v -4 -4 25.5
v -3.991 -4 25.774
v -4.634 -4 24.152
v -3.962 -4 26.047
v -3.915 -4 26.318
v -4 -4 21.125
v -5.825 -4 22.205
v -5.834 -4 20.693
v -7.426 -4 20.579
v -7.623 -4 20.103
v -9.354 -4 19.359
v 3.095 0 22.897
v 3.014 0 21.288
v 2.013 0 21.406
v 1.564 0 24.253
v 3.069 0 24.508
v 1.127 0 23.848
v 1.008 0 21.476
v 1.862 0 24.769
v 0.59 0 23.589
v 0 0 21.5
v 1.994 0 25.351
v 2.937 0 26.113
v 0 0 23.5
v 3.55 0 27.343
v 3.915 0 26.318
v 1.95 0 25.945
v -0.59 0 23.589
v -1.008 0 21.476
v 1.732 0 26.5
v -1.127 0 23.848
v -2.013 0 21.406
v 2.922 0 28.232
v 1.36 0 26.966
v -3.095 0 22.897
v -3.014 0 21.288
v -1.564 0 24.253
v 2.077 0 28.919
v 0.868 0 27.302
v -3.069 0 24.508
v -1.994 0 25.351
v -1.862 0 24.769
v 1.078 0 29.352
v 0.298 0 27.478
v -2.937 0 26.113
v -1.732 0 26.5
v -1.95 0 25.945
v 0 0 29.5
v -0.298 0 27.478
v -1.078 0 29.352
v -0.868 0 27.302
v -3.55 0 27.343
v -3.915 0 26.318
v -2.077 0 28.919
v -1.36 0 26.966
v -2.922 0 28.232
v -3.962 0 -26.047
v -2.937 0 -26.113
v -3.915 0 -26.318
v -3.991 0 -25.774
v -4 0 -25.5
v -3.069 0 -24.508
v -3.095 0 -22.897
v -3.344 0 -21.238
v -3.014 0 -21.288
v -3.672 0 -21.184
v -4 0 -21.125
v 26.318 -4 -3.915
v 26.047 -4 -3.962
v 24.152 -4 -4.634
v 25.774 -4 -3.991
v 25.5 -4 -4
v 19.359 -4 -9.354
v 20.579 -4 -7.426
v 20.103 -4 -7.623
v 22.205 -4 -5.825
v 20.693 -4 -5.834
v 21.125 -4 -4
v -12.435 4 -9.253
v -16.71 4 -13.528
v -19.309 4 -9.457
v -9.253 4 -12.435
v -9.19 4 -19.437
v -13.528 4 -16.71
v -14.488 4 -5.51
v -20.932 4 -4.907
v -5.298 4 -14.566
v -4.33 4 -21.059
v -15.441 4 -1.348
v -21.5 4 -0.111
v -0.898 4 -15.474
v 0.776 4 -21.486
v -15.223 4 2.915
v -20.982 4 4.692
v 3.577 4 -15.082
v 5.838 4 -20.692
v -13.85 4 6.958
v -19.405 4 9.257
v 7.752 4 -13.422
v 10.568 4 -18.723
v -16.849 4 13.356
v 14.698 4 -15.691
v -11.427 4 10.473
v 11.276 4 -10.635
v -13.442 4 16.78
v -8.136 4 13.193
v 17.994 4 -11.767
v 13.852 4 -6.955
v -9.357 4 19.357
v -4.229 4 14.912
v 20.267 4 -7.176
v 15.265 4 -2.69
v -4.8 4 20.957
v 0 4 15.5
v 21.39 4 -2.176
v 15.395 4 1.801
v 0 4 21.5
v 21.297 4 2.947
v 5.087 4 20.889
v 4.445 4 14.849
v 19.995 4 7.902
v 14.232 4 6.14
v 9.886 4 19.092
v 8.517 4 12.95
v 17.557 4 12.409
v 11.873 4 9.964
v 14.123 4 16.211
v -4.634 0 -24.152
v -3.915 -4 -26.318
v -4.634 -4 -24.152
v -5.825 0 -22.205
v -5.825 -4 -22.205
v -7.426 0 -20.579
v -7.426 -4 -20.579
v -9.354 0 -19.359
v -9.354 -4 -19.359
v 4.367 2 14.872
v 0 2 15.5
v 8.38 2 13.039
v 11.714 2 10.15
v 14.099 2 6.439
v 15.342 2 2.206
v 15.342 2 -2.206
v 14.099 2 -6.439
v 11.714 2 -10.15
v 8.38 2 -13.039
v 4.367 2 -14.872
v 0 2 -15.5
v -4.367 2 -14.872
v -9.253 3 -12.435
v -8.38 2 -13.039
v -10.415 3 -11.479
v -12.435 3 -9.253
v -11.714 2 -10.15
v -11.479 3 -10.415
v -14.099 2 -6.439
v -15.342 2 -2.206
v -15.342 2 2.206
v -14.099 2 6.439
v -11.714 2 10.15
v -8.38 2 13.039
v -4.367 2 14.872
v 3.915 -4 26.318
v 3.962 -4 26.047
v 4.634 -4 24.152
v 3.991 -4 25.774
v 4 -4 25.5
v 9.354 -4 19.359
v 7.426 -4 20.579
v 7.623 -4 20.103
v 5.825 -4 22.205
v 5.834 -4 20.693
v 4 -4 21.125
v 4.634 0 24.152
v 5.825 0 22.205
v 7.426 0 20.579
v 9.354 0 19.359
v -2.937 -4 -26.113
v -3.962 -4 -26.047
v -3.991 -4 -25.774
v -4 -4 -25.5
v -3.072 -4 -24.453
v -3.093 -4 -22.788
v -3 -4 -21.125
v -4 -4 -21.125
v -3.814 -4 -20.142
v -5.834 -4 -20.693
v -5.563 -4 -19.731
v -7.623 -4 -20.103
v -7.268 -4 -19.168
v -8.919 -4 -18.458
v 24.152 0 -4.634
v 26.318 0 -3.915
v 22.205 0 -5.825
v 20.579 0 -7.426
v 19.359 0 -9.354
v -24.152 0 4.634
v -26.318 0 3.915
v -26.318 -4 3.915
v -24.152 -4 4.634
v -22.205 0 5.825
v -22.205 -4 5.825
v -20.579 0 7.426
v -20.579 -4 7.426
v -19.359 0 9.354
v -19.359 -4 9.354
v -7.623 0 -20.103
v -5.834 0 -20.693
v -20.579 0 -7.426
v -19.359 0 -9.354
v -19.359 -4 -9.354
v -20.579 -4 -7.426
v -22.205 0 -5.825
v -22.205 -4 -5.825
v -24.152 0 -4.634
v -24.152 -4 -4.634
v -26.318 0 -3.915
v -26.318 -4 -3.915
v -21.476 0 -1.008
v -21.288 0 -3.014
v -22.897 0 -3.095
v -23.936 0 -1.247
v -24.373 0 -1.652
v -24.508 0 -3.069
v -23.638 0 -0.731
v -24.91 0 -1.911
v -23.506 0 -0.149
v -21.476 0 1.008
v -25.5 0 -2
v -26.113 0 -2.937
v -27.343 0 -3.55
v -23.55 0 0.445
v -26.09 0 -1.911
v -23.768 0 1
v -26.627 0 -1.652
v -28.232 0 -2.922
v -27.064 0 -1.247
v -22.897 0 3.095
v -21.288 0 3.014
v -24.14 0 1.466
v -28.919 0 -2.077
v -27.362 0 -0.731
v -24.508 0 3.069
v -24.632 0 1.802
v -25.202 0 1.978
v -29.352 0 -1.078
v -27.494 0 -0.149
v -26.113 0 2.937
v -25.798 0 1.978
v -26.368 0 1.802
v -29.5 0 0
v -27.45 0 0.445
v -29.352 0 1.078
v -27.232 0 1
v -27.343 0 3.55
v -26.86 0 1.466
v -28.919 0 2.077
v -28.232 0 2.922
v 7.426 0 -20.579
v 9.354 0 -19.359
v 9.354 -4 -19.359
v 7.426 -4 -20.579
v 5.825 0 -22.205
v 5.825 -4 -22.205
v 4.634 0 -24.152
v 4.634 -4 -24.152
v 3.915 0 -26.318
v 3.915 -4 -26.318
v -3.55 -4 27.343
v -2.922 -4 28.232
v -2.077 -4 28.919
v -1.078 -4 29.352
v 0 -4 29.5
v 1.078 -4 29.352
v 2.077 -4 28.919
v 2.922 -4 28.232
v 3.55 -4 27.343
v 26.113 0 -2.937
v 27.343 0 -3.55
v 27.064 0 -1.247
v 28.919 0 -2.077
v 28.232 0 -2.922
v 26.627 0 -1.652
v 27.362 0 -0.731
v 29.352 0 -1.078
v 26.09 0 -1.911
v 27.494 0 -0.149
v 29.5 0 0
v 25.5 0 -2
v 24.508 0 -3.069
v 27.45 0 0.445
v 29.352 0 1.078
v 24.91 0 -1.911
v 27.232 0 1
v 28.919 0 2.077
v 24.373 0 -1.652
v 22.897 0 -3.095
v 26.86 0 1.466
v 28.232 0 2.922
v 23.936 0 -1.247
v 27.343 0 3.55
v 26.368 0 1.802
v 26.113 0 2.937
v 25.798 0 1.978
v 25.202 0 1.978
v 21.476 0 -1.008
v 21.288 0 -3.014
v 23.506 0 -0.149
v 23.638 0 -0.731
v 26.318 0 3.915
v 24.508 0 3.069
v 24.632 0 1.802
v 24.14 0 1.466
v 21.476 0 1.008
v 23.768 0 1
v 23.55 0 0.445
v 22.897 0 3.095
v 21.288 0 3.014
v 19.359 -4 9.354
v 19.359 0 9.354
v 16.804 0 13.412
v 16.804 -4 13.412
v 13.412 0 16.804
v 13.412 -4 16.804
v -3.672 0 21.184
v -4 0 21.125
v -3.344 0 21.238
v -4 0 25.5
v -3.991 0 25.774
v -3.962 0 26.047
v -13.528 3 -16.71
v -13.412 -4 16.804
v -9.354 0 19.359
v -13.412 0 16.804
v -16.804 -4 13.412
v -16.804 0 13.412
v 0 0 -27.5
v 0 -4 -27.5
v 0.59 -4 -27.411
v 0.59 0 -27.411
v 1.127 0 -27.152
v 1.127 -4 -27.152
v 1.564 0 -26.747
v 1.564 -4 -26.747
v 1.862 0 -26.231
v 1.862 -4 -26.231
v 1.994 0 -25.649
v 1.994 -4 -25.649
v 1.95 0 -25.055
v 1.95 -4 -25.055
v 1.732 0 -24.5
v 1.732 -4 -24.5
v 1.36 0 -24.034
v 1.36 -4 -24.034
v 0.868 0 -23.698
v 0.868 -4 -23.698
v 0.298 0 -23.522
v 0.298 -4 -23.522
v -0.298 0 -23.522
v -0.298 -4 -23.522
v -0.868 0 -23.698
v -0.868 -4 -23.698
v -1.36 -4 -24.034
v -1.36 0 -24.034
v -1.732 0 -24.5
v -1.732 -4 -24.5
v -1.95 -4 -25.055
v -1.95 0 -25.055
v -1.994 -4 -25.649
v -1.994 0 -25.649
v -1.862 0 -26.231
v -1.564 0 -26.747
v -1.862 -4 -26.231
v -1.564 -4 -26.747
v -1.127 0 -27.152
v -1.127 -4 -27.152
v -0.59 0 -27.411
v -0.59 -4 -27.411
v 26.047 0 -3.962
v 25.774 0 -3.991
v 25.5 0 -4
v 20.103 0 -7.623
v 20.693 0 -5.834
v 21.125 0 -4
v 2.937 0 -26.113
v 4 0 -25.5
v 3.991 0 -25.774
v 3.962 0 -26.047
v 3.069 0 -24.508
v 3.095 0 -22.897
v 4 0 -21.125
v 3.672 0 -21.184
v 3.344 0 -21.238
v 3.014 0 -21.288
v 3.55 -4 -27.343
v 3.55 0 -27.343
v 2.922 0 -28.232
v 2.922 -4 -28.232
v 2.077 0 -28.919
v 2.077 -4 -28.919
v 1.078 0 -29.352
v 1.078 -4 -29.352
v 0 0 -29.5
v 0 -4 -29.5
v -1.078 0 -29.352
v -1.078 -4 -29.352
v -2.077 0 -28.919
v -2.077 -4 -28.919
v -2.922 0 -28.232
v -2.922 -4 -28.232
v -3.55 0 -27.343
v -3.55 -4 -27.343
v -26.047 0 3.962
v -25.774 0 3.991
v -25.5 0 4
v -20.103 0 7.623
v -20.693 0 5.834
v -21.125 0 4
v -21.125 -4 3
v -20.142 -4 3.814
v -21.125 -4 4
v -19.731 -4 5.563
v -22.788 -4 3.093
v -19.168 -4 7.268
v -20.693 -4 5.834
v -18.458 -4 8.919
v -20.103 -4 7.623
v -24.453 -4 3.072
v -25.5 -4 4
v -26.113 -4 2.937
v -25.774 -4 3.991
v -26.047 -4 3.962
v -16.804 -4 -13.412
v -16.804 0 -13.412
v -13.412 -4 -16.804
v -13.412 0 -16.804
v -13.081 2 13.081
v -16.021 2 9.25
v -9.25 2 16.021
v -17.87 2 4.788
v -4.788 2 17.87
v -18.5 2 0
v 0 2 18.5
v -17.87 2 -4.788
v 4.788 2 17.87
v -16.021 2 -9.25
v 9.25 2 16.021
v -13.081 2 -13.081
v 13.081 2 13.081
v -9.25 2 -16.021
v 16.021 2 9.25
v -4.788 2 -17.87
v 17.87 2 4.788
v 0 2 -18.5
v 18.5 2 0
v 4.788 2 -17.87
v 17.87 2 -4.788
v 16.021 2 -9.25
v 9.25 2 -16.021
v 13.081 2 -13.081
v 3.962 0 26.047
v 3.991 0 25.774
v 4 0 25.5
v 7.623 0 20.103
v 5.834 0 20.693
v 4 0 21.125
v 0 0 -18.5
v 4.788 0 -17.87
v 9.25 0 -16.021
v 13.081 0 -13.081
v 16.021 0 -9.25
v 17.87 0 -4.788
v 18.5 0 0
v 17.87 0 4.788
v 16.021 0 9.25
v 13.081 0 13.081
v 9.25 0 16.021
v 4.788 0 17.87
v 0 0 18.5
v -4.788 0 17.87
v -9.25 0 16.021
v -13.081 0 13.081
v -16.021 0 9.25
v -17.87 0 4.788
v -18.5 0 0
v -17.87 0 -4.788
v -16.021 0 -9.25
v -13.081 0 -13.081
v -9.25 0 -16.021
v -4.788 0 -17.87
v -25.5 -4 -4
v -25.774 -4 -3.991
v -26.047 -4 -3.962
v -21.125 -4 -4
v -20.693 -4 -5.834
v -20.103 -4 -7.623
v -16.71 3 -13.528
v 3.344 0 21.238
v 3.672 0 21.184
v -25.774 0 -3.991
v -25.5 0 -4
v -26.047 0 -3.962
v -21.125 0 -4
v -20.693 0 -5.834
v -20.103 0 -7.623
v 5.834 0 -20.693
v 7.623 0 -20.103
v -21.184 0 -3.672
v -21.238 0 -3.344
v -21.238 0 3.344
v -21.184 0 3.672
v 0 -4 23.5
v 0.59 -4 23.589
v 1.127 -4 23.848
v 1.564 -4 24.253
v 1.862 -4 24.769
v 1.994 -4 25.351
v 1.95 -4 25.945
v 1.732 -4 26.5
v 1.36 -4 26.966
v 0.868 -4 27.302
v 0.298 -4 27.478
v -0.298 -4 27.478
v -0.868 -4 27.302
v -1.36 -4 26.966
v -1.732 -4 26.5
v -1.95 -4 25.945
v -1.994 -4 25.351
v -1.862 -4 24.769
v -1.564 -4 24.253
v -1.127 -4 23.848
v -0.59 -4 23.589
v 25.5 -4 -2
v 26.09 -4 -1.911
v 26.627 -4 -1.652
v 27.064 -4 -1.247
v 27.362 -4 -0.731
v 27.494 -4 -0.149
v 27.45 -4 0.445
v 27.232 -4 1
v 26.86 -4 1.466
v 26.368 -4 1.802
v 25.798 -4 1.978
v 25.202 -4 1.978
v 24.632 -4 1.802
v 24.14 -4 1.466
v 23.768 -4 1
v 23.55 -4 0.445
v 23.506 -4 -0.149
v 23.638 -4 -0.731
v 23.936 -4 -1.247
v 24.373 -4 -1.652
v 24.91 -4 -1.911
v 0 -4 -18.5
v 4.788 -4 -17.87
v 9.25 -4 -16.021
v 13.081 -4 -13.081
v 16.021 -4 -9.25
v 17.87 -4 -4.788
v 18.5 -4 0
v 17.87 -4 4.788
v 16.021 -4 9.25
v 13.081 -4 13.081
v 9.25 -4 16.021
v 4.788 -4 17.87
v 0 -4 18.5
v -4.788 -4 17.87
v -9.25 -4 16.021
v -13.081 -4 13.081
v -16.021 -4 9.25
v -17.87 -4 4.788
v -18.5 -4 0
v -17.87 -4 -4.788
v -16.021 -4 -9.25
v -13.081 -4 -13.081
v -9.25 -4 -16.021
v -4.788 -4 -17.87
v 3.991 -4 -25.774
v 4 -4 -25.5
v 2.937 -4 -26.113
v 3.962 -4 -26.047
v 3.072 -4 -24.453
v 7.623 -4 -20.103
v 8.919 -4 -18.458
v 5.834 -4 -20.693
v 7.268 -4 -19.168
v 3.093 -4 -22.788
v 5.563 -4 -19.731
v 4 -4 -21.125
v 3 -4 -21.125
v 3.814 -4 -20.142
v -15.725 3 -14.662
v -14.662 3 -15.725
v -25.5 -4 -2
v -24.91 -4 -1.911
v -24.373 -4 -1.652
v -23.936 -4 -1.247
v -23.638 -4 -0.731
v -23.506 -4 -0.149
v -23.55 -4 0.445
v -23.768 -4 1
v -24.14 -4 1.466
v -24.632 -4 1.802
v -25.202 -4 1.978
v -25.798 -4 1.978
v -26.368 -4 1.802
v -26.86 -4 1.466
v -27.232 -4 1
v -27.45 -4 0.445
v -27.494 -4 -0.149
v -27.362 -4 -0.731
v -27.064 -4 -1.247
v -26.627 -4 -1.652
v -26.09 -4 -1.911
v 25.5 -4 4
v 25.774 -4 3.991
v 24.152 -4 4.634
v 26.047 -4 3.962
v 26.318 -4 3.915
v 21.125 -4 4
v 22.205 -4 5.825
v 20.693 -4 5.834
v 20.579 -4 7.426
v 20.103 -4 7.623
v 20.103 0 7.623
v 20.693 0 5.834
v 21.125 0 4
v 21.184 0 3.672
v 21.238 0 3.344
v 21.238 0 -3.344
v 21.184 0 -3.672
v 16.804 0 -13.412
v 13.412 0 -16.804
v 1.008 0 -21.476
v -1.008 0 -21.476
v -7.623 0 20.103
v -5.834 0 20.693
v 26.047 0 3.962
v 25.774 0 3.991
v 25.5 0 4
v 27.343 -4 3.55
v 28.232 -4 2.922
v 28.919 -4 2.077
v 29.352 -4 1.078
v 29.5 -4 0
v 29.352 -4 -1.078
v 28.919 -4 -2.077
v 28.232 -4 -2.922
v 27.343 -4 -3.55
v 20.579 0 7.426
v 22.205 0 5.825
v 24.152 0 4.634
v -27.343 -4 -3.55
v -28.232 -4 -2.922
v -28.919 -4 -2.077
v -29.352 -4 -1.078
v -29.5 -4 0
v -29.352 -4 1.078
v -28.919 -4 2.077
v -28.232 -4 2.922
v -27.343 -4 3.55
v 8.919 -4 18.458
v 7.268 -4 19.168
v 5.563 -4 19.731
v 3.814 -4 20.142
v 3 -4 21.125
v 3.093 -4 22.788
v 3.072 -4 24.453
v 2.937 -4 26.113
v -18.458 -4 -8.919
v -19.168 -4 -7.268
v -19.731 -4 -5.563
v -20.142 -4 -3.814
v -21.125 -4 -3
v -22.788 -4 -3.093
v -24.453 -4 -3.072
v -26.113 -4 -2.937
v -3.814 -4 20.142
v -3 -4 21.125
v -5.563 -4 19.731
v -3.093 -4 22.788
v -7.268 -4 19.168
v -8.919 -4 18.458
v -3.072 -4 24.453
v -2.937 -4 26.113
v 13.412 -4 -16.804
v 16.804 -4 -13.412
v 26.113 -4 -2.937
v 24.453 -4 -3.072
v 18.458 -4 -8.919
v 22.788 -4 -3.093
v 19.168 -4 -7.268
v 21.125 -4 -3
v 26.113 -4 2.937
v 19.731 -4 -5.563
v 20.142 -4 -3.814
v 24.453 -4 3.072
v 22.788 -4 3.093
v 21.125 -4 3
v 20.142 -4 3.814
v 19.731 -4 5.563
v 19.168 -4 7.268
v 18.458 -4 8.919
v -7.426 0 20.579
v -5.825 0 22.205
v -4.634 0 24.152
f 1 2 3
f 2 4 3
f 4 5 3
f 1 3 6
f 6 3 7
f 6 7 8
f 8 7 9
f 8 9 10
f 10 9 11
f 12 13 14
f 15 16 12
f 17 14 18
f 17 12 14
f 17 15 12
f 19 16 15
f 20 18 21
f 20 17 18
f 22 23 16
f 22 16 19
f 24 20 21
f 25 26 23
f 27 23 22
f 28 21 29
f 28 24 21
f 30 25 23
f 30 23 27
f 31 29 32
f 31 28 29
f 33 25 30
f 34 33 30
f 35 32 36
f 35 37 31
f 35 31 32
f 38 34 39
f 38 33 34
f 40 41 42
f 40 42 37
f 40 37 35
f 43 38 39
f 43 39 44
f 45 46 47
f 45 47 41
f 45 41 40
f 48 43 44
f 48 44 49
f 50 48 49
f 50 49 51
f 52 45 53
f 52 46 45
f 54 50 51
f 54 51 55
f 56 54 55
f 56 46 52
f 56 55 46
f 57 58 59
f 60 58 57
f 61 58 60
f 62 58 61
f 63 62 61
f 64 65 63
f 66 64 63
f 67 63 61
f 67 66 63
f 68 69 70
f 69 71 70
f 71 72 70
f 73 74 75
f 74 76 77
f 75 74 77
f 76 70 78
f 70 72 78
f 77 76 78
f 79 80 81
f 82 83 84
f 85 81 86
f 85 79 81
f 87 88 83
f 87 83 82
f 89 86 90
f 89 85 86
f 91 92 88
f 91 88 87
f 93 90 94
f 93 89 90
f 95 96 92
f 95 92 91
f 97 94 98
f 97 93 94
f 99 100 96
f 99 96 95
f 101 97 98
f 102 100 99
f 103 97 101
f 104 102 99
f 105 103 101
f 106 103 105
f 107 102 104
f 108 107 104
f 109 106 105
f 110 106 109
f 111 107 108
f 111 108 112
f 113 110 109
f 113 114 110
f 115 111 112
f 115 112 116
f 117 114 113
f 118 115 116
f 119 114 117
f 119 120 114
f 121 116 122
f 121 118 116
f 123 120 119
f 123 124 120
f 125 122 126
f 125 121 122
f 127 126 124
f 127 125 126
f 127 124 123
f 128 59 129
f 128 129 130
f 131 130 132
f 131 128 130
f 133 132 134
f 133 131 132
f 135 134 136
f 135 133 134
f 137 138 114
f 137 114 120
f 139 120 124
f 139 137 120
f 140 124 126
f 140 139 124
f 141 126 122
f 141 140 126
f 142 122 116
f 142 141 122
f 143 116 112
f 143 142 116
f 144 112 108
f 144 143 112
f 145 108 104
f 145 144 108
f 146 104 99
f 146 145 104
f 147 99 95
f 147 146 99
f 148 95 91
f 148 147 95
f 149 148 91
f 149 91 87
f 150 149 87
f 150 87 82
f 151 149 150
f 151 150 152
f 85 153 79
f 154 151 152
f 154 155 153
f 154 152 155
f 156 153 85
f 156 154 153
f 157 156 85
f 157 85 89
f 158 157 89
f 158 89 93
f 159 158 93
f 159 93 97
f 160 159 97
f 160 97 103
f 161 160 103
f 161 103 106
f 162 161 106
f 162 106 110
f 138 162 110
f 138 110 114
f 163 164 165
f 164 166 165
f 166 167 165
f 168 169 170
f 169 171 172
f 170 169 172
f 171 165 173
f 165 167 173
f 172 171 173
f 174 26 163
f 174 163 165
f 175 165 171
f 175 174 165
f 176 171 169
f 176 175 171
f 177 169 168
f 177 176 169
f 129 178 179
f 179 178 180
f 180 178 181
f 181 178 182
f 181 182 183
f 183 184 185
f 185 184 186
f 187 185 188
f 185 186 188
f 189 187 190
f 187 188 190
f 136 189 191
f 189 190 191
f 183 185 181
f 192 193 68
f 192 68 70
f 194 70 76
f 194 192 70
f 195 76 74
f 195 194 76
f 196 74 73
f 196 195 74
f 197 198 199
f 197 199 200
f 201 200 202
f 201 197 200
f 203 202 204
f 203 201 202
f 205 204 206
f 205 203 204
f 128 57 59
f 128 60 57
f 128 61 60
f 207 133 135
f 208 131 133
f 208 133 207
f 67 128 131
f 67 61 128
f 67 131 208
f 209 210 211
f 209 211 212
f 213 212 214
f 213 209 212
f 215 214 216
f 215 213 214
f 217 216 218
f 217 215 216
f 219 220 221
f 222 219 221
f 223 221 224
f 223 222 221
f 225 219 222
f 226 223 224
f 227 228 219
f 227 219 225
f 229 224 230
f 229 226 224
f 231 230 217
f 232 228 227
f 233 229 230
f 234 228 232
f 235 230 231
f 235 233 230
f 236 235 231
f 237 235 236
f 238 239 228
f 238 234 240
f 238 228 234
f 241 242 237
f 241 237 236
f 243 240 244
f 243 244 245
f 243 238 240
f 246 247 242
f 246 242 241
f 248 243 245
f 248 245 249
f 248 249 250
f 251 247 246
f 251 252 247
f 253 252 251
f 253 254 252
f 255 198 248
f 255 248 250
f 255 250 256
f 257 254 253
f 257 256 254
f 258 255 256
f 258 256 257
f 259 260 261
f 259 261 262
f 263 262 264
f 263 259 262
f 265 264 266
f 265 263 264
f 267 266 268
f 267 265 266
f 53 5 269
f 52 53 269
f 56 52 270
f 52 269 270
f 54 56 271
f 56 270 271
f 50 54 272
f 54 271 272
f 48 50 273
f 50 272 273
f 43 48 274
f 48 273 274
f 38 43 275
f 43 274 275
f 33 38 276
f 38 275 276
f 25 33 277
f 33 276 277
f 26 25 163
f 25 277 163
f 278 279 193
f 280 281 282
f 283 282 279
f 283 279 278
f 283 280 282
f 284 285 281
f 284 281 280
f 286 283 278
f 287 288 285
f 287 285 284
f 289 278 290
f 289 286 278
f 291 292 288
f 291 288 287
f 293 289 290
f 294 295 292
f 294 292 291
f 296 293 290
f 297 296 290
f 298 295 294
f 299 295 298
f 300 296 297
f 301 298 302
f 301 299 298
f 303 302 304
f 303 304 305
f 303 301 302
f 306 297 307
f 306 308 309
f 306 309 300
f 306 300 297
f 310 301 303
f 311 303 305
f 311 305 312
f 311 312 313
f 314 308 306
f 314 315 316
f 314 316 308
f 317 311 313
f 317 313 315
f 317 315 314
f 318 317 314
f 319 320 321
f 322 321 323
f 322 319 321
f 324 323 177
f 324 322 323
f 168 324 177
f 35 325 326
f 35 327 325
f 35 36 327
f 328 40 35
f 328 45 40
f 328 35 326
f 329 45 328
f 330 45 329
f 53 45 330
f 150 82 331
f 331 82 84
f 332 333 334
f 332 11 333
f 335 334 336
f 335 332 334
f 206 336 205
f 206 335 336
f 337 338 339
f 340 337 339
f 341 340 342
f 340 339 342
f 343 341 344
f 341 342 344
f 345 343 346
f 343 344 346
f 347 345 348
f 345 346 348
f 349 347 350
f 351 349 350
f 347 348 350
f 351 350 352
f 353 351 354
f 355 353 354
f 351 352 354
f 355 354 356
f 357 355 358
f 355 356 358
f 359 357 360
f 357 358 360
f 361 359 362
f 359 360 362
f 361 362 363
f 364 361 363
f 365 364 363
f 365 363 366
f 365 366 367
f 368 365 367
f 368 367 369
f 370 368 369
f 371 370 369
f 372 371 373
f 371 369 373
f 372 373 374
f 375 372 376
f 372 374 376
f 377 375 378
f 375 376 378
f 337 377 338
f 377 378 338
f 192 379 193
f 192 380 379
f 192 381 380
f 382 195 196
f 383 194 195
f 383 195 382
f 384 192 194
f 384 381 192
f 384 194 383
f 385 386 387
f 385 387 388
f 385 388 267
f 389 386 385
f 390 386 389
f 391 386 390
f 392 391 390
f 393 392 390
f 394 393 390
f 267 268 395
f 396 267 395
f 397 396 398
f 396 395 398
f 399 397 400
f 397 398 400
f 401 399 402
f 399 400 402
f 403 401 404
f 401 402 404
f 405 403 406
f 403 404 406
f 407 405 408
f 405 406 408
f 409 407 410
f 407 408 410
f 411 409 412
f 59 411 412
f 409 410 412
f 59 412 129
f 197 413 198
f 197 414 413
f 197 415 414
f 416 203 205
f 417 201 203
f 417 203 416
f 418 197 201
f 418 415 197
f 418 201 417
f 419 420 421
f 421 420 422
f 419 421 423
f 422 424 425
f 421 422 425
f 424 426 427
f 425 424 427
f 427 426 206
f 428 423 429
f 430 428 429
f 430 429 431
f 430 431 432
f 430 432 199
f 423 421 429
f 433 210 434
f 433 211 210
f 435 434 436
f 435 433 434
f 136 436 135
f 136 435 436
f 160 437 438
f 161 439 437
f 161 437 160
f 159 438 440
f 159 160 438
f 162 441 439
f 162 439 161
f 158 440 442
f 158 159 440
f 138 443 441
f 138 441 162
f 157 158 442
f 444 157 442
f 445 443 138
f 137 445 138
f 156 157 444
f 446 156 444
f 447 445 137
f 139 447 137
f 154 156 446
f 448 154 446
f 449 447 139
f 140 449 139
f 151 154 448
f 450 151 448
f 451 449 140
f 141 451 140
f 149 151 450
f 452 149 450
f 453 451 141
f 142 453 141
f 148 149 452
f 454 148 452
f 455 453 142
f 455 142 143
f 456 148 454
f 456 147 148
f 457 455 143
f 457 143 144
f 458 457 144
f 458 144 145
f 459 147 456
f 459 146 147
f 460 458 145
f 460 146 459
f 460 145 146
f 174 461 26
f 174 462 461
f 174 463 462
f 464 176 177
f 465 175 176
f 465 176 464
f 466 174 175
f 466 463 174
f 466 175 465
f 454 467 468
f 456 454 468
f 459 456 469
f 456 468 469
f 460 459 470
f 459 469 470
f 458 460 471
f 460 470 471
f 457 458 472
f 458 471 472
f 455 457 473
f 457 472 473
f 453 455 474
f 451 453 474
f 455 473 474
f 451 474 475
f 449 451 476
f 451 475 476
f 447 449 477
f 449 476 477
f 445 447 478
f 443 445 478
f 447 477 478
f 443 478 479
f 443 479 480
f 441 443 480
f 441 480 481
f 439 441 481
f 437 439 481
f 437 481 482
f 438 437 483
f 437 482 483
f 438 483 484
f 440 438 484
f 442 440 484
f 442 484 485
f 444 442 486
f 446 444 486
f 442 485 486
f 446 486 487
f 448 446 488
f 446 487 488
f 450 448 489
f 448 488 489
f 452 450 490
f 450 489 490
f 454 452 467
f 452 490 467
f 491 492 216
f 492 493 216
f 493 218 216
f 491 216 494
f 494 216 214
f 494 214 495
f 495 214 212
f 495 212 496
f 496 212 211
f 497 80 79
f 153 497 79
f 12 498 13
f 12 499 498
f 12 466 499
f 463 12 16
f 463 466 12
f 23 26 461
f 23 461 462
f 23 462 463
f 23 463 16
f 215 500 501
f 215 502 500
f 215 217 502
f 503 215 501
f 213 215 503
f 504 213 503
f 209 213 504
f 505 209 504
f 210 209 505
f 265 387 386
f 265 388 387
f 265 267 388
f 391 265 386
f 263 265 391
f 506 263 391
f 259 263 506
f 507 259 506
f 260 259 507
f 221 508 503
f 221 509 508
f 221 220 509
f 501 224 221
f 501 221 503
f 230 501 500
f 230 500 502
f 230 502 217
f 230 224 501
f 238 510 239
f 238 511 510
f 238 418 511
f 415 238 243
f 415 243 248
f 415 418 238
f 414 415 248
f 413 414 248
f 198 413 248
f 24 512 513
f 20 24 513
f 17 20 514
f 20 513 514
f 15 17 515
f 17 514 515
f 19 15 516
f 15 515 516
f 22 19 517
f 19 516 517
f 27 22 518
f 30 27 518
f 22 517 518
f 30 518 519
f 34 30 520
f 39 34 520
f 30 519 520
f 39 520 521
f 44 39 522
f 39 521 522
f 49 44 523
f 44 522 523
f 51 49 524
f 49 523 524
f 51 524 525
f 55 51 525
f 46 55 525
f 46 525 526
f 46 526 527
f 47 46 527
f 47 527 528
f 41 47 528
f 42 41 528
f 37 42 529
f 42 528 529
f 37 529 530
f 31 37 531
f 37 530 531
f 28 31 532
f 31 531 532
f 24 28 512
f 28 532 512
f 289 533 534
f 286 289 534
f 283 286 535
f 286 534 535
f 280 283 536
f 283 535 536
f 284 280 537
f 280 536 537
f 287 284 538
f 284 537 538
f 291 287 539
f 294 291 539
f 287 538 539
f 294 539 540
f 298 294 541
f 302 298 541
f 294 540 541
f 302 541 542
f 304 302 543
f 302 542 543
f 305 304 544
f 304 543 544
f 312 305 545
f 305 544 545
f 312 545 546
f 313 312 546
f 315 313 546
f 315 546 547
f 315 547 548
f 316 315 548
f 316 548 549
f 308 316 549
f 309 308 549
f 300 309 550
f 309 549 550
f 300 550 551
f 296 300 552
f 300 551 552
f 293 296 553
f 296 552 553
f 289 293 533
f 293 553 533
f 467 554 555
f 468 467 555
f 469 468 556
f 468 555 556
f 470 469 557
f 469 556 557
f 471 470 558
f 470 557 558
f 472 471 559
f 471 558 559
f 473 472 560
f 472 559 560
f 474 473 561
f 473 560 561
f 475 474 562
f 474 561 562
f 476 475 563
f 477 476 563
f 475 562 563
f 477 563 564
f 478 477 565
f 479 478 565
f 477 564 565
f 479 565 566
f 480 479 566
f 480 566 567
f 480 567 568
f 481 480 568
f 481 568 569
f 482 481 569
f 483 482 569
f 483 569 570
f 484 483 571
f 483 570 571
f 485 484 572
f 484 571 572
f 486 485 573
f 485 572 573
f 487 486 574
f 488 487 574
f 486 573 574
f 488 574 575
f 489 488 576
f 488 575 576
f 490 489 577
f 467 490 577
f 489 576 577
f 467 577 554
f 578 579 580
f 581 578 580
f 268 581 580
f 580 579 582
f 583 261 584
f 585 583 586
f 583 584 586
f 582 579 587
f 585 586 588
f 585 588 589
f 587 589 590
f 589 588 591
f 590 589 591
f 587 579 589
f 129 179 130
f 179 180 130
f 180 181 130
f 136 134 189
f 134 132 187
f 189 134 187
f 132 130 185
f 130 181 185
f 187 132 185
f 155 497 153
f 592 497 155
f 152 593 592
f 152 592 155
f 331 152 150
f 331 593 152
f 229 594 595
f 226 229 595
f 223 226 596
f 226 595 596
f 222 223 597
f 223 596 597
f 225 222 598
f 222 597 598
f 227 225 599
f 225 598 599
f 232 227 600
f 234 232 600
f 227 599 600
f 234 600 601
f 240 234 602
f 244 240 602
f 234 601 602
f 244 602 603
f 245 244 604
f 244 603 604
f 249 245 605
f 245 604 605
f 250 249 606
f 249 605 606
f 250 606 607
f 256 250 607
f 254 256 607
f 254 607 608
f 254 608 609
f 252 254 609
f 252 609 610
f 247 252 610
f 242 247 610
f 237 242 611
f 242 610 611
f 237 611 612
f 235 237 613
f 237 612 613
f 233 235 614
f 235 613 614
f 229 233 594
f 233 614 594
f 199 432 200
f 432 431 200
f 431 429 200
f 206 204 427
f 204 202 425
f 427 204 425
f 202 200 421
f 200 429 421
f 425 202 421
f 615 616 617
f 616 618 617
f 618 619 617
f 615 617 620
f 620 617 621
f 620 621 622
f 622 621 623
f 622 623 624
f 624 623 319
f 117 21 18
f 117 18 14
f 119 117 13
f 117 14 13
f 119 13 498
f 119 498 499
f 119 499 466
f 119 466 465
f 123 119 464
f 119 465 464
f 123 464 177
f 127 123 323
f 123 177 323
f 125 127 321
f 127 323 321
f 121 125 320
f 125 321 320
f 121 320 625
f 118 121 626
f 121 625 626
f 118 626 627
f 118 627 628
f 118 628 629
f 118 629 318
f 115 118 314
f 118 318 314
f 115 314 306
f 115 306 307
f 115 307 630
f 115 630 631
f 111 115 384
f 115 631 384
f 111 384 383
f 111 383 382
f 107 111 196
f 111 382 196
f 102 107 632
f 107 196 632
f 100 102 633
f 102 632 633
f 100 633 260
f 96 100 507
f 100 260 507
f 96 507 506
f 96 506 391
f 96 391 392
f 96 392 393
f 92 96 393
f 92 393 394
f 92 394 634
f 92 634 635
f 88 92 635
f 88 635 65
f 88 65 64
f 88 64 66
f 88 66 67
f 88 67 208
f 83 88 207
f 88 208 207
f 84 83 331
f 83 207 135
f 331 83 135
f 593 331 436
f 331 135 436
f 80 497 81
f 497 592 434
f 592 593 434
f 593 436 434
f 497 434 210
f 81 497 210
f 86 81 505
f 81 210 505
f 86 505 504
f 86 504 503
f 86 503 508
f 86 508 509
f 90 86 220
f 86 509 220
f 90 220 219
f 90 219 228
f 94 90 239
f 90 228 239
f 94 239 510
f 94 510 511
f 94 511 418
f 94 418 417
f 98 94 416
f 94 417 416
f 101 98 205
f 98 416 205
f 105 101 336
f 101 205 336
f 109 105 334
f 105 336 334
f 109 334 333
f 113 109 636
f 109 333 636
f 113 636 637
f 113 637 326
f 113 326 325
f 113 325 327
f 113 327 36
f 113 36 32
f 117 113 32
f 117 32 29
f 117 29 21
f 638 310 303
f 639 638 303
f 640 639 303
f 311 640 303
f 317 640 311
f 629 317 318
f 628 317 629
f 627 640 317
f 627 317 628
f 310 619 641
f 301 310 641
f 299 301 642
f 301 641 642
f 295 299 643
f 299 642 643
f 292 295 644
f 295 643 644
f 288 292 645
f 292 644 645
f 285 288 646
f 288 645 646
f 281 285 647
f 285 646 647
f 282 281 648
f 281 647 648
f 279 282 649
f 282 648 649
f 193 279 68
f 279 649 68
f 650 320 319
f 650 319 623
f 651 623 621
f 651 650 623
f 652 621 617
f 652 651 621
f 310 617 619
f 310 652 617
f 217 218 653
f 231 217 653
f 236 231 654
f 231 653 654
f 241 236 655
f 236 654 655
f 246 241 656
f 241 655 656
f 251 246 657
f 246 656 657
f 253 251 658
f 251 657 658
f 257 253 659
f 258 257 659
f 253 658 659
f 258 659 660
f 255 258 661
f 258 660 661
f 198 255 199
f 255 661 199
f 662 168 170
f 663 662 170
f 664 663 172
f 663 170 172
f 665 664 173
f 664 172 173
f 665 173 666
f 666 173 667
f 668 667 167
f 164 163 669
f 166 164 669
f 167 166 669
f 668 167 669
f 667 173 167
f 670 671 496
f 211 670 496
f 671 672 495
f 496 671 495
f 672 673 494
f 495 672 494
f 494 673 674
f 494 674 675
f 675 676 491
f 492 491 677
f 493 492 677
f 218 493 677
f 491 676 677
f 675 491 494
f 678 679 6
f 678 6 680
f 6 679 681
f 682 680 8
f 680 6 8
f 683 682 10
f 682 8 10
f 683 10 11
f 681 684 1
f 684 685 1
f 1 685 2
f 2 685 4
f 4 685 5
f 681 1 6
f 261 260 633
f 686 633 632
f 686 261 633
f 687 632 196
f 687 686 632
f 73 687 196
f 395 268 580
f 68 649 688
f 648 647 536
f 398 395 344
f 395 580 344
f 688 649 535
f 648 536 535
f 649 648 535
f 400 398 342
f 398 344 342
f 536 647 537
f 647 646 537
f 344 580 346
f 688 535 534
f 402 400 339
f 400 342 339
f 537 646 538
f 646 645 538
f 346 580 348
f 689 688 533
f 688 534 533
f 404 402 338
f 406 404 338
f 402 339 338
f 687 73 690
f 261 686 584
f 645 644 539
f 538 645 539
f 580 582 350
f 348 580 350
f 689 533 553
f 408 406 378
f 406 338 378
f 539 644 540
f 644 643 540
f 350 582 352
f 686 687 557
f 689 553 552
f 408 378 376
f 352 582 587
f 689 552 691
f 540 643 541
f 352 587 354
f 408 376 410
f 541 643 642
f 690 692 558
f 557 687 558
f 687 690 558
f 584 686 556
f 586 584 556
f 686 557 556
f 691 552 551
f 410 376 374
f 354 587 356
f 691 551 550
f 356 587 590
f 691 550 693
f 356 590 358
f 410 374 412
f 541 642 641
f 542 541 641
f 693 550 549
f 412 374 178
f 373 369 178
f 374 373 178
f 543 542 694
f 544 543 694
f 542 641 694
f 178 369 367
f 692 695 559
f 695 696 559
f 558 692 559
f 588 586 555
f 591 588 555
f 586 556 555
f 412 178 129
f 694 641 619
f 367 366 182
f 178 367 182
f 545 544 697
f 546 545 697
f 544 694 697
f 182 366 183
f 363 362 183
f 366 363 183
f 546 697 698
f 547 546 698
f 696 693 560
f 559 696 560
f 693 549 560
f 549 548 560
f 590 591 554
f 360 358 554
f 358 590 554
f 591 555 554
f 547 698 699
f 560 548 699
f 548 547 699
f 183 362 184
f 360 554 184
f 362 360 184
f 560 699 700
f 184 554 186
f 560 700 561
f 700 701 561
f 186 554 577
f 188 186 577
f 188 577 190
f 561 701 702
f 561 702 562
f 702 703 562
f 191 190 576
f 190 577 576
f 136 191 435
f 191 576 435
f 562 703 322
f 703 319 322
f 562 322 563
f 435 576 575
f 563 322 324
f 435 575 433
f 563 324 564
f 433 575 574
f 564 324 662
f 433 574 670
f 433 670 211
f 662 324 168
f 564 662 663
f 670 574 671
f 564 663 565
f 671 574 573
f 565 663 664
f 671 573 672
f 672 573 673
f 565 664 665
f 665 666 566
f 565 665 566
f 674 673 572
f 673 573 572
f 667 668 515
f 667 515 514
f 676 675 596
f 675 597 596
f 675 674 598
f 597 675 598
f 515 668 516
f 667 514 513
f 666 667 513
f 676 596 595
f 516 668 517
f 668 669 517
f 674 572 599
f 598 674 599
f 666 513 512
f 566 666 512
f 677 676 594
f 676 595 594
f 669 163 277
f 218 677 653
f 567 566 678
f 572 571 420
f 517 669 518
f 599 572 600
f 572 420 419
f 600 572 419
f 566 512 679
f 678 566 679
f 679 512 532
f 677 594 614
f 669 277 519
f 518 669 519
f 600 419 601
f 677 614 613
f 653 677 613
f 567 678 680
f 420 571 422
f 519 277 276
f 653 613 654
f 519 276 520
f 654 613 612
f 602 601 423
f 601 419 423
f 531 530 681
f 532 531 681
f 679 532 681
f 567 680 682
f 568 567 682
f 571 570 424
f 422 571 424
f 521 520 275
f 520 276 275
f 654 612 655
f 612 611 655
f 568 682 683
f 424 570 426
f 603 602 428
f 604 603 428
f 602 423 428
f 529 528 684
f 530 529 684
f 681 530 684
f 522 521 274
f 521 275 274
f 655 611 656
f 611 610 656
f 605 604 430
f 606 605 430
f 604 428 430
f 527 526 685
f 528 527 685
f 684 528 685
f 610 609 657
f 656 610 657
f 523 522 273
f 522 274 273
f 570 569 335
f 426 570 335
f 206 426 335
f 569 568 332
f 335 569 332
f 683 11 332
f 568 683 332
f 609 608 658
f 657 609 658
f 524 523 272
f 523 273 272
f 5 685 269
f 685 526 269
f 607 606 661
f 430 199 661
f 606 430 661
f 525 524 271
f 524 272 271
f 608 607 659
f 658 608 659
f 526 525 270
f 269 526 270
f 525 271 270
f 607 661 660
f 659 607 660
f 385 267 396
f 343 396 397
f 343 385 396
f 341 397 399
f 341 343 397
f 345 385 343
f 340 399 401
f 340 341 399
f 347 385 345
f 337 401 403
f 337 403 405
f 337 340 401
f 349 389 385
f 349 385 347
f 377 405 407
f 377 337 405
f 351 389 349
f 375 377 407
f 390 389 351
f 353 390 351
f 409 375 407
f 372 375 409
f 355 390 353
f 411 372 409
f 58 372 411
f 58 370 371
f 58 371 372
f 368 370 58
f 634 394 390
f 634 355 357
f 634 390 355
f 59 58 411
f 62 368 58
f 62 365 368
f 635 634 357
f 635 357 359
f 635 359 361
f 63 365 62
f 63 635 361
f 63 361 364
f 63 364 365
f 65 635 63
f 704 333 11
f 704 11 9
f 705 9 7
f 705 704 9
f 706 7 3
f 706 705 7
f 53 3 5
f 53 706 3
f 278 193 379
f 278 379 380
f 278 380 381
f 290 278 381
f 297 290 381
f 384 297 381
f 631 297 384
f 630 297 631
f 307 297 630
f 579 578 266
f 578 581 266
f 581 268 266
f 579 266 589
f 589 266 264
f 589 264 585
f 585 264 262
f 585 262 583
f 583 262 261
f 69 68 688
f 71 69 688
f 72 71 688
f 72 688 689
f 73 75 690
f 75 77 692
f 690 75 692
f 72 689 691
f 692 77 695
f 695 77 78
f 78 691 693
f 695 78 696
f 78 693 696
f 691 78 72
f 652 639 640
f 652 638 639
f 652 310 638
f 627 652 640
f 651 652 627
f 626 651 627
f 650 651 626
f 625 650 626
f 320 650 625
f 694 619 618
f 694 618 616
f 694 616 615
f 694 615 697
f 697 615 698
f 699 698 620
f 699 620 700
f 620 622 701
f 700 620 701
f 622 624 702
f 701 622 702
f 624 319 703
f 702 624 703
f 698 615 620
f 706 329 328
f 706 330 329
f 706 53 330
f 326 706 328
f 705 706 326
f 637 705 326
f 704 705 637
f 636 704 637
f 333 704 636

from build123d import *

# Parameters (mm, degrees)
SKETCH1_R           = 21.5
SKETCH1_R_2         = 15.5
BOSS_EXTRUDE1_DEPTH = 4
BOSS_EXTRUDE2_START = 4
SKETCH2_R           = 21.5
SKETCH2_R_2         = 18.5
BOSS_EXTRUDE2_DEPTH = 4
SKETCH3_R           = 18.5
SKETCH3_R_2         = 15
CUT_EXTRUDE1_DEPTH  = 2
SKETCH4_R           = 2
BOSS_EXTRUDE3_DEPTH = 4
FILLET1_R           = 10
CUT_EXTRUDE3_DEPTH  = 1


with BuildPart() as part:
    # Sketch1 → Boss-Extrude1 (new body)
    with BuildSketch(Plane(origin=(0, 0, 0), x_dir=(1, 0, 0), z_dir=(0, 1, 0))):
        with Locations(Location((0, 0, 0), (0, 0, 270))):
            Circle(SKETCH1_R)
        with Locations(Location((0, 0, 0), (0, 0, 270))):
            Circle(SKETCH1_R_2, mode=Mode.SUBTRACT)
    extrude(amount=BOSS_EXTRUDE1_DEPTH)

    # Sketch2 → Boss-Extrude2 (add)
    with BuildSketch(Plane.XZ.offset(BOSS_EXTRUDE2_START)):
        with Locations(Location((0, 0, 0), (0, 0, 270))):
            Circle(SKETCH2_R)
        with Locations(Location((0, 0, 0), (0, 0, 270))):
            Circle(SKETCH2_R_2, mode=Mode.SUBTRACT)
    extrude(amount=-BOSS_EXTRUDE2_DEPTH)

    # Sketch3 → Cut-Extrude1 (cut)
    with BuildSketch(Plane.XZ):
        with Locations(Location((0, 0, 0), (0, 0, 270))):
            Circle(SKETCH3_R)
        Circle(SKETCH3_R_2, mode=Mode.SUBTRACT)
    extrude(amount=-CUT_EXTRUDE1_DEPTH, mode=Mode.SUBTRACT)

    # Sketch4 → Boss-Extrude3 (add)
    # profile 1 of 4: a face of its own
    with BuildSketch(Plane.XZ.offset(4)):
        with BuildLine():
            Line((-25.5, 4), (-20.187008248, 4))
            Line((-20.187008248, 4), (-20.187008248, -4))
            Line((-20.187008248, -4), (-25.5, -4))
            ThreePointArc((-25.5, -4), (-29.5, 0), (-25.5, 4))
        make_face()
        with Locations(Location((-25.5, 0, 0), (0, 0, 270))):
            Circle(SKETCH4_R, mode=Mode.SUBTRACT)
    # profile 2 of 4: a face of its own
    with BuildSketch(Plane.XZ.offset(4)):
        with BuildLine():
            Line((4, 20.187008248), (-4, 20.187008248))
            Line((-4, 20.187008248), (-4, 25.5))
            ThreePointArc((-4, 25.5), (0, 29.5), (4, 25.5))
            Line((4, 25.5), (4, 20.187008248))
        make_face()
        with Locations(Location((0, 25.5, 0), (0, 0, 270))):
            Circle(SKETCH4_R, mode=Mode.SUBTRACT)
    # profile 3 of 4: a face of its own
    with BuildSketch(Plane.XZ.offset(4)):
        with BuildLine():
            Line((20.187008248, -4), (20.187008248, 4))
            Line((20.187008248, 4), (25.5, 4))
            ThreePointArc((25.5, 4), (29.5, 0), (25.5, -4))
            Line((25.5, -4), (20.187008248, -4))
        make_face()
        with Locations(Location((25.5, 0, 0), (0, 0, 270))):
            Circle(SKETCH4_R, mode=Mode.SUBTRACT)
    # profile 4 of 4: a face of its own
    with BuildSketch(Plane.XZ.offset(4)):
        with BuildLine():
            Line((-4, -20.187008248), (4, -20.187008248))
            Line((4, -20.187008248), (4, -25.5))
            ThreePointArc((4, -25.5), (0, -29.5), (-4, -25.5))
            Line((-4, -25.5), (-4, -20.187008248))
        make_face()
        with Locations(Location((0, -25.5, 0), (0, 0, 270))):
            Circle(SKETCH4_R, mode=Mode.SUBTRACT)
    extrude(amount=-BOSS_EXTRUDE3_DEPTH)

    # Fillet1
    # the kernel refuses this fillet: 10 mm, written as the material it adds along each edge
    with BuildSketch(Plane(origin=(-4, 0, 21.124630174), x_dir=(0.016272387136782942, 0, 0.9998675959430181), z_dir=(0, -1, 0)), Plane(origin=(4, 0, -21.124630174), x_dir=(-0.01627238713686073, 0, -0.9998675959430169), z_dir=(0, -1, 0)), Plane(origin=(-21.124630174, 0, -4), x_dir=(-0.9998675959430171, 0, 0.01627238713684981), z_dir=(0, -1, 0)), Plane(origin=(21.124630174, 0, 4), x_dir=(0.9998675959430179, 0, -0.01627238713679413), z_dir=(0, -1, 0))) as fillet1_piece_1:
        with BuildLine():
            CenterArc((7.07924631, 9.82068168), FILLET1_R, 206.72107826, 52.41213662)
            Line((-1.852813991, 5.324205419), (-2.746020021, 4.874557792))
            ThreePointArc((-2.746020021, 4.874557792), (-1.695593605, 2.394427141), (-0.979383425, -0.202010165))
            Line((-0.979383425, -0.202010165), (0.016272387, -0.999867596))
            ThreePointArc((0.016272387, -0.999867596), (4.391062896, -0.928669884), (5.00545854, -0.982068168))
            Line((5.00545854, -0.982068168), (5.193984701, 0))
        make_face()
    extrude(amount=4)
    with BuildSketch(Plane(origin=(-21.124630174, 0, 4), x_dir=(-0.9998675959430171, 0, -0.016272387136849455), z_dir=(0, -1, 0)), Plane(origin=(-4, 0, -21.124630174), x_dir=(0.0162723871369052, 0, -0.9998675959430161), z_dir=(0, -1, 0)), Plane(origin=(21.124630174, 0, -4), x_dir=(0.9998675959430168, 0, 0.016272387136866445), z_dir=(0, -1, 0)), Plane(origin=(4, 0, 21.124630174), x_dir=(-0.0162723871368113, 0, 0.9998675959430178), z_dir=(0, -1, 0))) as fillet1_piece_2:
        with BuildLine():
            CenterArc((7.07924631, -9.82068168), FILLET1_R, 100.86678512, 52.41213662)
            Line((-1.852813991, -5.324205419), (-2.746020021, -4.874557792))
            ThreePointArc((-2.746020021, -4.874557792), (-1.695593605, -2.394427141), (-0.979383425, 0.202010165))
            Line((-0.979383425, 0.202010165), (0.016272387, 0.999867596))
            ThreePointArc((0.016272387, 0.999867596), (4.391062896, 0.928669884), (5.00545854, 0.982068168))
            Line((5.00545854, 0.982068168), (5.193984701, 0))
        make_face()
    extrude(amount=4)

    # Sketch6 → Cut-Extrude3 (cut)
    with BuildSketch(Plane(origin=(0, 4, 0), x_dir=(1, 0, 0), z_dir=(0, 1, 0))):
        Polygon((-8.667268163, 11.849248678), (-15.190647858, 18.372628373), (-18.372628373, 15.190647858), (-11.849248678, 8.667268163), align=None)
    extrude(amount=-CUT_EXTRUDE3_DEPTH, mode=Mode.SUBTRACT)


solid = part.part
